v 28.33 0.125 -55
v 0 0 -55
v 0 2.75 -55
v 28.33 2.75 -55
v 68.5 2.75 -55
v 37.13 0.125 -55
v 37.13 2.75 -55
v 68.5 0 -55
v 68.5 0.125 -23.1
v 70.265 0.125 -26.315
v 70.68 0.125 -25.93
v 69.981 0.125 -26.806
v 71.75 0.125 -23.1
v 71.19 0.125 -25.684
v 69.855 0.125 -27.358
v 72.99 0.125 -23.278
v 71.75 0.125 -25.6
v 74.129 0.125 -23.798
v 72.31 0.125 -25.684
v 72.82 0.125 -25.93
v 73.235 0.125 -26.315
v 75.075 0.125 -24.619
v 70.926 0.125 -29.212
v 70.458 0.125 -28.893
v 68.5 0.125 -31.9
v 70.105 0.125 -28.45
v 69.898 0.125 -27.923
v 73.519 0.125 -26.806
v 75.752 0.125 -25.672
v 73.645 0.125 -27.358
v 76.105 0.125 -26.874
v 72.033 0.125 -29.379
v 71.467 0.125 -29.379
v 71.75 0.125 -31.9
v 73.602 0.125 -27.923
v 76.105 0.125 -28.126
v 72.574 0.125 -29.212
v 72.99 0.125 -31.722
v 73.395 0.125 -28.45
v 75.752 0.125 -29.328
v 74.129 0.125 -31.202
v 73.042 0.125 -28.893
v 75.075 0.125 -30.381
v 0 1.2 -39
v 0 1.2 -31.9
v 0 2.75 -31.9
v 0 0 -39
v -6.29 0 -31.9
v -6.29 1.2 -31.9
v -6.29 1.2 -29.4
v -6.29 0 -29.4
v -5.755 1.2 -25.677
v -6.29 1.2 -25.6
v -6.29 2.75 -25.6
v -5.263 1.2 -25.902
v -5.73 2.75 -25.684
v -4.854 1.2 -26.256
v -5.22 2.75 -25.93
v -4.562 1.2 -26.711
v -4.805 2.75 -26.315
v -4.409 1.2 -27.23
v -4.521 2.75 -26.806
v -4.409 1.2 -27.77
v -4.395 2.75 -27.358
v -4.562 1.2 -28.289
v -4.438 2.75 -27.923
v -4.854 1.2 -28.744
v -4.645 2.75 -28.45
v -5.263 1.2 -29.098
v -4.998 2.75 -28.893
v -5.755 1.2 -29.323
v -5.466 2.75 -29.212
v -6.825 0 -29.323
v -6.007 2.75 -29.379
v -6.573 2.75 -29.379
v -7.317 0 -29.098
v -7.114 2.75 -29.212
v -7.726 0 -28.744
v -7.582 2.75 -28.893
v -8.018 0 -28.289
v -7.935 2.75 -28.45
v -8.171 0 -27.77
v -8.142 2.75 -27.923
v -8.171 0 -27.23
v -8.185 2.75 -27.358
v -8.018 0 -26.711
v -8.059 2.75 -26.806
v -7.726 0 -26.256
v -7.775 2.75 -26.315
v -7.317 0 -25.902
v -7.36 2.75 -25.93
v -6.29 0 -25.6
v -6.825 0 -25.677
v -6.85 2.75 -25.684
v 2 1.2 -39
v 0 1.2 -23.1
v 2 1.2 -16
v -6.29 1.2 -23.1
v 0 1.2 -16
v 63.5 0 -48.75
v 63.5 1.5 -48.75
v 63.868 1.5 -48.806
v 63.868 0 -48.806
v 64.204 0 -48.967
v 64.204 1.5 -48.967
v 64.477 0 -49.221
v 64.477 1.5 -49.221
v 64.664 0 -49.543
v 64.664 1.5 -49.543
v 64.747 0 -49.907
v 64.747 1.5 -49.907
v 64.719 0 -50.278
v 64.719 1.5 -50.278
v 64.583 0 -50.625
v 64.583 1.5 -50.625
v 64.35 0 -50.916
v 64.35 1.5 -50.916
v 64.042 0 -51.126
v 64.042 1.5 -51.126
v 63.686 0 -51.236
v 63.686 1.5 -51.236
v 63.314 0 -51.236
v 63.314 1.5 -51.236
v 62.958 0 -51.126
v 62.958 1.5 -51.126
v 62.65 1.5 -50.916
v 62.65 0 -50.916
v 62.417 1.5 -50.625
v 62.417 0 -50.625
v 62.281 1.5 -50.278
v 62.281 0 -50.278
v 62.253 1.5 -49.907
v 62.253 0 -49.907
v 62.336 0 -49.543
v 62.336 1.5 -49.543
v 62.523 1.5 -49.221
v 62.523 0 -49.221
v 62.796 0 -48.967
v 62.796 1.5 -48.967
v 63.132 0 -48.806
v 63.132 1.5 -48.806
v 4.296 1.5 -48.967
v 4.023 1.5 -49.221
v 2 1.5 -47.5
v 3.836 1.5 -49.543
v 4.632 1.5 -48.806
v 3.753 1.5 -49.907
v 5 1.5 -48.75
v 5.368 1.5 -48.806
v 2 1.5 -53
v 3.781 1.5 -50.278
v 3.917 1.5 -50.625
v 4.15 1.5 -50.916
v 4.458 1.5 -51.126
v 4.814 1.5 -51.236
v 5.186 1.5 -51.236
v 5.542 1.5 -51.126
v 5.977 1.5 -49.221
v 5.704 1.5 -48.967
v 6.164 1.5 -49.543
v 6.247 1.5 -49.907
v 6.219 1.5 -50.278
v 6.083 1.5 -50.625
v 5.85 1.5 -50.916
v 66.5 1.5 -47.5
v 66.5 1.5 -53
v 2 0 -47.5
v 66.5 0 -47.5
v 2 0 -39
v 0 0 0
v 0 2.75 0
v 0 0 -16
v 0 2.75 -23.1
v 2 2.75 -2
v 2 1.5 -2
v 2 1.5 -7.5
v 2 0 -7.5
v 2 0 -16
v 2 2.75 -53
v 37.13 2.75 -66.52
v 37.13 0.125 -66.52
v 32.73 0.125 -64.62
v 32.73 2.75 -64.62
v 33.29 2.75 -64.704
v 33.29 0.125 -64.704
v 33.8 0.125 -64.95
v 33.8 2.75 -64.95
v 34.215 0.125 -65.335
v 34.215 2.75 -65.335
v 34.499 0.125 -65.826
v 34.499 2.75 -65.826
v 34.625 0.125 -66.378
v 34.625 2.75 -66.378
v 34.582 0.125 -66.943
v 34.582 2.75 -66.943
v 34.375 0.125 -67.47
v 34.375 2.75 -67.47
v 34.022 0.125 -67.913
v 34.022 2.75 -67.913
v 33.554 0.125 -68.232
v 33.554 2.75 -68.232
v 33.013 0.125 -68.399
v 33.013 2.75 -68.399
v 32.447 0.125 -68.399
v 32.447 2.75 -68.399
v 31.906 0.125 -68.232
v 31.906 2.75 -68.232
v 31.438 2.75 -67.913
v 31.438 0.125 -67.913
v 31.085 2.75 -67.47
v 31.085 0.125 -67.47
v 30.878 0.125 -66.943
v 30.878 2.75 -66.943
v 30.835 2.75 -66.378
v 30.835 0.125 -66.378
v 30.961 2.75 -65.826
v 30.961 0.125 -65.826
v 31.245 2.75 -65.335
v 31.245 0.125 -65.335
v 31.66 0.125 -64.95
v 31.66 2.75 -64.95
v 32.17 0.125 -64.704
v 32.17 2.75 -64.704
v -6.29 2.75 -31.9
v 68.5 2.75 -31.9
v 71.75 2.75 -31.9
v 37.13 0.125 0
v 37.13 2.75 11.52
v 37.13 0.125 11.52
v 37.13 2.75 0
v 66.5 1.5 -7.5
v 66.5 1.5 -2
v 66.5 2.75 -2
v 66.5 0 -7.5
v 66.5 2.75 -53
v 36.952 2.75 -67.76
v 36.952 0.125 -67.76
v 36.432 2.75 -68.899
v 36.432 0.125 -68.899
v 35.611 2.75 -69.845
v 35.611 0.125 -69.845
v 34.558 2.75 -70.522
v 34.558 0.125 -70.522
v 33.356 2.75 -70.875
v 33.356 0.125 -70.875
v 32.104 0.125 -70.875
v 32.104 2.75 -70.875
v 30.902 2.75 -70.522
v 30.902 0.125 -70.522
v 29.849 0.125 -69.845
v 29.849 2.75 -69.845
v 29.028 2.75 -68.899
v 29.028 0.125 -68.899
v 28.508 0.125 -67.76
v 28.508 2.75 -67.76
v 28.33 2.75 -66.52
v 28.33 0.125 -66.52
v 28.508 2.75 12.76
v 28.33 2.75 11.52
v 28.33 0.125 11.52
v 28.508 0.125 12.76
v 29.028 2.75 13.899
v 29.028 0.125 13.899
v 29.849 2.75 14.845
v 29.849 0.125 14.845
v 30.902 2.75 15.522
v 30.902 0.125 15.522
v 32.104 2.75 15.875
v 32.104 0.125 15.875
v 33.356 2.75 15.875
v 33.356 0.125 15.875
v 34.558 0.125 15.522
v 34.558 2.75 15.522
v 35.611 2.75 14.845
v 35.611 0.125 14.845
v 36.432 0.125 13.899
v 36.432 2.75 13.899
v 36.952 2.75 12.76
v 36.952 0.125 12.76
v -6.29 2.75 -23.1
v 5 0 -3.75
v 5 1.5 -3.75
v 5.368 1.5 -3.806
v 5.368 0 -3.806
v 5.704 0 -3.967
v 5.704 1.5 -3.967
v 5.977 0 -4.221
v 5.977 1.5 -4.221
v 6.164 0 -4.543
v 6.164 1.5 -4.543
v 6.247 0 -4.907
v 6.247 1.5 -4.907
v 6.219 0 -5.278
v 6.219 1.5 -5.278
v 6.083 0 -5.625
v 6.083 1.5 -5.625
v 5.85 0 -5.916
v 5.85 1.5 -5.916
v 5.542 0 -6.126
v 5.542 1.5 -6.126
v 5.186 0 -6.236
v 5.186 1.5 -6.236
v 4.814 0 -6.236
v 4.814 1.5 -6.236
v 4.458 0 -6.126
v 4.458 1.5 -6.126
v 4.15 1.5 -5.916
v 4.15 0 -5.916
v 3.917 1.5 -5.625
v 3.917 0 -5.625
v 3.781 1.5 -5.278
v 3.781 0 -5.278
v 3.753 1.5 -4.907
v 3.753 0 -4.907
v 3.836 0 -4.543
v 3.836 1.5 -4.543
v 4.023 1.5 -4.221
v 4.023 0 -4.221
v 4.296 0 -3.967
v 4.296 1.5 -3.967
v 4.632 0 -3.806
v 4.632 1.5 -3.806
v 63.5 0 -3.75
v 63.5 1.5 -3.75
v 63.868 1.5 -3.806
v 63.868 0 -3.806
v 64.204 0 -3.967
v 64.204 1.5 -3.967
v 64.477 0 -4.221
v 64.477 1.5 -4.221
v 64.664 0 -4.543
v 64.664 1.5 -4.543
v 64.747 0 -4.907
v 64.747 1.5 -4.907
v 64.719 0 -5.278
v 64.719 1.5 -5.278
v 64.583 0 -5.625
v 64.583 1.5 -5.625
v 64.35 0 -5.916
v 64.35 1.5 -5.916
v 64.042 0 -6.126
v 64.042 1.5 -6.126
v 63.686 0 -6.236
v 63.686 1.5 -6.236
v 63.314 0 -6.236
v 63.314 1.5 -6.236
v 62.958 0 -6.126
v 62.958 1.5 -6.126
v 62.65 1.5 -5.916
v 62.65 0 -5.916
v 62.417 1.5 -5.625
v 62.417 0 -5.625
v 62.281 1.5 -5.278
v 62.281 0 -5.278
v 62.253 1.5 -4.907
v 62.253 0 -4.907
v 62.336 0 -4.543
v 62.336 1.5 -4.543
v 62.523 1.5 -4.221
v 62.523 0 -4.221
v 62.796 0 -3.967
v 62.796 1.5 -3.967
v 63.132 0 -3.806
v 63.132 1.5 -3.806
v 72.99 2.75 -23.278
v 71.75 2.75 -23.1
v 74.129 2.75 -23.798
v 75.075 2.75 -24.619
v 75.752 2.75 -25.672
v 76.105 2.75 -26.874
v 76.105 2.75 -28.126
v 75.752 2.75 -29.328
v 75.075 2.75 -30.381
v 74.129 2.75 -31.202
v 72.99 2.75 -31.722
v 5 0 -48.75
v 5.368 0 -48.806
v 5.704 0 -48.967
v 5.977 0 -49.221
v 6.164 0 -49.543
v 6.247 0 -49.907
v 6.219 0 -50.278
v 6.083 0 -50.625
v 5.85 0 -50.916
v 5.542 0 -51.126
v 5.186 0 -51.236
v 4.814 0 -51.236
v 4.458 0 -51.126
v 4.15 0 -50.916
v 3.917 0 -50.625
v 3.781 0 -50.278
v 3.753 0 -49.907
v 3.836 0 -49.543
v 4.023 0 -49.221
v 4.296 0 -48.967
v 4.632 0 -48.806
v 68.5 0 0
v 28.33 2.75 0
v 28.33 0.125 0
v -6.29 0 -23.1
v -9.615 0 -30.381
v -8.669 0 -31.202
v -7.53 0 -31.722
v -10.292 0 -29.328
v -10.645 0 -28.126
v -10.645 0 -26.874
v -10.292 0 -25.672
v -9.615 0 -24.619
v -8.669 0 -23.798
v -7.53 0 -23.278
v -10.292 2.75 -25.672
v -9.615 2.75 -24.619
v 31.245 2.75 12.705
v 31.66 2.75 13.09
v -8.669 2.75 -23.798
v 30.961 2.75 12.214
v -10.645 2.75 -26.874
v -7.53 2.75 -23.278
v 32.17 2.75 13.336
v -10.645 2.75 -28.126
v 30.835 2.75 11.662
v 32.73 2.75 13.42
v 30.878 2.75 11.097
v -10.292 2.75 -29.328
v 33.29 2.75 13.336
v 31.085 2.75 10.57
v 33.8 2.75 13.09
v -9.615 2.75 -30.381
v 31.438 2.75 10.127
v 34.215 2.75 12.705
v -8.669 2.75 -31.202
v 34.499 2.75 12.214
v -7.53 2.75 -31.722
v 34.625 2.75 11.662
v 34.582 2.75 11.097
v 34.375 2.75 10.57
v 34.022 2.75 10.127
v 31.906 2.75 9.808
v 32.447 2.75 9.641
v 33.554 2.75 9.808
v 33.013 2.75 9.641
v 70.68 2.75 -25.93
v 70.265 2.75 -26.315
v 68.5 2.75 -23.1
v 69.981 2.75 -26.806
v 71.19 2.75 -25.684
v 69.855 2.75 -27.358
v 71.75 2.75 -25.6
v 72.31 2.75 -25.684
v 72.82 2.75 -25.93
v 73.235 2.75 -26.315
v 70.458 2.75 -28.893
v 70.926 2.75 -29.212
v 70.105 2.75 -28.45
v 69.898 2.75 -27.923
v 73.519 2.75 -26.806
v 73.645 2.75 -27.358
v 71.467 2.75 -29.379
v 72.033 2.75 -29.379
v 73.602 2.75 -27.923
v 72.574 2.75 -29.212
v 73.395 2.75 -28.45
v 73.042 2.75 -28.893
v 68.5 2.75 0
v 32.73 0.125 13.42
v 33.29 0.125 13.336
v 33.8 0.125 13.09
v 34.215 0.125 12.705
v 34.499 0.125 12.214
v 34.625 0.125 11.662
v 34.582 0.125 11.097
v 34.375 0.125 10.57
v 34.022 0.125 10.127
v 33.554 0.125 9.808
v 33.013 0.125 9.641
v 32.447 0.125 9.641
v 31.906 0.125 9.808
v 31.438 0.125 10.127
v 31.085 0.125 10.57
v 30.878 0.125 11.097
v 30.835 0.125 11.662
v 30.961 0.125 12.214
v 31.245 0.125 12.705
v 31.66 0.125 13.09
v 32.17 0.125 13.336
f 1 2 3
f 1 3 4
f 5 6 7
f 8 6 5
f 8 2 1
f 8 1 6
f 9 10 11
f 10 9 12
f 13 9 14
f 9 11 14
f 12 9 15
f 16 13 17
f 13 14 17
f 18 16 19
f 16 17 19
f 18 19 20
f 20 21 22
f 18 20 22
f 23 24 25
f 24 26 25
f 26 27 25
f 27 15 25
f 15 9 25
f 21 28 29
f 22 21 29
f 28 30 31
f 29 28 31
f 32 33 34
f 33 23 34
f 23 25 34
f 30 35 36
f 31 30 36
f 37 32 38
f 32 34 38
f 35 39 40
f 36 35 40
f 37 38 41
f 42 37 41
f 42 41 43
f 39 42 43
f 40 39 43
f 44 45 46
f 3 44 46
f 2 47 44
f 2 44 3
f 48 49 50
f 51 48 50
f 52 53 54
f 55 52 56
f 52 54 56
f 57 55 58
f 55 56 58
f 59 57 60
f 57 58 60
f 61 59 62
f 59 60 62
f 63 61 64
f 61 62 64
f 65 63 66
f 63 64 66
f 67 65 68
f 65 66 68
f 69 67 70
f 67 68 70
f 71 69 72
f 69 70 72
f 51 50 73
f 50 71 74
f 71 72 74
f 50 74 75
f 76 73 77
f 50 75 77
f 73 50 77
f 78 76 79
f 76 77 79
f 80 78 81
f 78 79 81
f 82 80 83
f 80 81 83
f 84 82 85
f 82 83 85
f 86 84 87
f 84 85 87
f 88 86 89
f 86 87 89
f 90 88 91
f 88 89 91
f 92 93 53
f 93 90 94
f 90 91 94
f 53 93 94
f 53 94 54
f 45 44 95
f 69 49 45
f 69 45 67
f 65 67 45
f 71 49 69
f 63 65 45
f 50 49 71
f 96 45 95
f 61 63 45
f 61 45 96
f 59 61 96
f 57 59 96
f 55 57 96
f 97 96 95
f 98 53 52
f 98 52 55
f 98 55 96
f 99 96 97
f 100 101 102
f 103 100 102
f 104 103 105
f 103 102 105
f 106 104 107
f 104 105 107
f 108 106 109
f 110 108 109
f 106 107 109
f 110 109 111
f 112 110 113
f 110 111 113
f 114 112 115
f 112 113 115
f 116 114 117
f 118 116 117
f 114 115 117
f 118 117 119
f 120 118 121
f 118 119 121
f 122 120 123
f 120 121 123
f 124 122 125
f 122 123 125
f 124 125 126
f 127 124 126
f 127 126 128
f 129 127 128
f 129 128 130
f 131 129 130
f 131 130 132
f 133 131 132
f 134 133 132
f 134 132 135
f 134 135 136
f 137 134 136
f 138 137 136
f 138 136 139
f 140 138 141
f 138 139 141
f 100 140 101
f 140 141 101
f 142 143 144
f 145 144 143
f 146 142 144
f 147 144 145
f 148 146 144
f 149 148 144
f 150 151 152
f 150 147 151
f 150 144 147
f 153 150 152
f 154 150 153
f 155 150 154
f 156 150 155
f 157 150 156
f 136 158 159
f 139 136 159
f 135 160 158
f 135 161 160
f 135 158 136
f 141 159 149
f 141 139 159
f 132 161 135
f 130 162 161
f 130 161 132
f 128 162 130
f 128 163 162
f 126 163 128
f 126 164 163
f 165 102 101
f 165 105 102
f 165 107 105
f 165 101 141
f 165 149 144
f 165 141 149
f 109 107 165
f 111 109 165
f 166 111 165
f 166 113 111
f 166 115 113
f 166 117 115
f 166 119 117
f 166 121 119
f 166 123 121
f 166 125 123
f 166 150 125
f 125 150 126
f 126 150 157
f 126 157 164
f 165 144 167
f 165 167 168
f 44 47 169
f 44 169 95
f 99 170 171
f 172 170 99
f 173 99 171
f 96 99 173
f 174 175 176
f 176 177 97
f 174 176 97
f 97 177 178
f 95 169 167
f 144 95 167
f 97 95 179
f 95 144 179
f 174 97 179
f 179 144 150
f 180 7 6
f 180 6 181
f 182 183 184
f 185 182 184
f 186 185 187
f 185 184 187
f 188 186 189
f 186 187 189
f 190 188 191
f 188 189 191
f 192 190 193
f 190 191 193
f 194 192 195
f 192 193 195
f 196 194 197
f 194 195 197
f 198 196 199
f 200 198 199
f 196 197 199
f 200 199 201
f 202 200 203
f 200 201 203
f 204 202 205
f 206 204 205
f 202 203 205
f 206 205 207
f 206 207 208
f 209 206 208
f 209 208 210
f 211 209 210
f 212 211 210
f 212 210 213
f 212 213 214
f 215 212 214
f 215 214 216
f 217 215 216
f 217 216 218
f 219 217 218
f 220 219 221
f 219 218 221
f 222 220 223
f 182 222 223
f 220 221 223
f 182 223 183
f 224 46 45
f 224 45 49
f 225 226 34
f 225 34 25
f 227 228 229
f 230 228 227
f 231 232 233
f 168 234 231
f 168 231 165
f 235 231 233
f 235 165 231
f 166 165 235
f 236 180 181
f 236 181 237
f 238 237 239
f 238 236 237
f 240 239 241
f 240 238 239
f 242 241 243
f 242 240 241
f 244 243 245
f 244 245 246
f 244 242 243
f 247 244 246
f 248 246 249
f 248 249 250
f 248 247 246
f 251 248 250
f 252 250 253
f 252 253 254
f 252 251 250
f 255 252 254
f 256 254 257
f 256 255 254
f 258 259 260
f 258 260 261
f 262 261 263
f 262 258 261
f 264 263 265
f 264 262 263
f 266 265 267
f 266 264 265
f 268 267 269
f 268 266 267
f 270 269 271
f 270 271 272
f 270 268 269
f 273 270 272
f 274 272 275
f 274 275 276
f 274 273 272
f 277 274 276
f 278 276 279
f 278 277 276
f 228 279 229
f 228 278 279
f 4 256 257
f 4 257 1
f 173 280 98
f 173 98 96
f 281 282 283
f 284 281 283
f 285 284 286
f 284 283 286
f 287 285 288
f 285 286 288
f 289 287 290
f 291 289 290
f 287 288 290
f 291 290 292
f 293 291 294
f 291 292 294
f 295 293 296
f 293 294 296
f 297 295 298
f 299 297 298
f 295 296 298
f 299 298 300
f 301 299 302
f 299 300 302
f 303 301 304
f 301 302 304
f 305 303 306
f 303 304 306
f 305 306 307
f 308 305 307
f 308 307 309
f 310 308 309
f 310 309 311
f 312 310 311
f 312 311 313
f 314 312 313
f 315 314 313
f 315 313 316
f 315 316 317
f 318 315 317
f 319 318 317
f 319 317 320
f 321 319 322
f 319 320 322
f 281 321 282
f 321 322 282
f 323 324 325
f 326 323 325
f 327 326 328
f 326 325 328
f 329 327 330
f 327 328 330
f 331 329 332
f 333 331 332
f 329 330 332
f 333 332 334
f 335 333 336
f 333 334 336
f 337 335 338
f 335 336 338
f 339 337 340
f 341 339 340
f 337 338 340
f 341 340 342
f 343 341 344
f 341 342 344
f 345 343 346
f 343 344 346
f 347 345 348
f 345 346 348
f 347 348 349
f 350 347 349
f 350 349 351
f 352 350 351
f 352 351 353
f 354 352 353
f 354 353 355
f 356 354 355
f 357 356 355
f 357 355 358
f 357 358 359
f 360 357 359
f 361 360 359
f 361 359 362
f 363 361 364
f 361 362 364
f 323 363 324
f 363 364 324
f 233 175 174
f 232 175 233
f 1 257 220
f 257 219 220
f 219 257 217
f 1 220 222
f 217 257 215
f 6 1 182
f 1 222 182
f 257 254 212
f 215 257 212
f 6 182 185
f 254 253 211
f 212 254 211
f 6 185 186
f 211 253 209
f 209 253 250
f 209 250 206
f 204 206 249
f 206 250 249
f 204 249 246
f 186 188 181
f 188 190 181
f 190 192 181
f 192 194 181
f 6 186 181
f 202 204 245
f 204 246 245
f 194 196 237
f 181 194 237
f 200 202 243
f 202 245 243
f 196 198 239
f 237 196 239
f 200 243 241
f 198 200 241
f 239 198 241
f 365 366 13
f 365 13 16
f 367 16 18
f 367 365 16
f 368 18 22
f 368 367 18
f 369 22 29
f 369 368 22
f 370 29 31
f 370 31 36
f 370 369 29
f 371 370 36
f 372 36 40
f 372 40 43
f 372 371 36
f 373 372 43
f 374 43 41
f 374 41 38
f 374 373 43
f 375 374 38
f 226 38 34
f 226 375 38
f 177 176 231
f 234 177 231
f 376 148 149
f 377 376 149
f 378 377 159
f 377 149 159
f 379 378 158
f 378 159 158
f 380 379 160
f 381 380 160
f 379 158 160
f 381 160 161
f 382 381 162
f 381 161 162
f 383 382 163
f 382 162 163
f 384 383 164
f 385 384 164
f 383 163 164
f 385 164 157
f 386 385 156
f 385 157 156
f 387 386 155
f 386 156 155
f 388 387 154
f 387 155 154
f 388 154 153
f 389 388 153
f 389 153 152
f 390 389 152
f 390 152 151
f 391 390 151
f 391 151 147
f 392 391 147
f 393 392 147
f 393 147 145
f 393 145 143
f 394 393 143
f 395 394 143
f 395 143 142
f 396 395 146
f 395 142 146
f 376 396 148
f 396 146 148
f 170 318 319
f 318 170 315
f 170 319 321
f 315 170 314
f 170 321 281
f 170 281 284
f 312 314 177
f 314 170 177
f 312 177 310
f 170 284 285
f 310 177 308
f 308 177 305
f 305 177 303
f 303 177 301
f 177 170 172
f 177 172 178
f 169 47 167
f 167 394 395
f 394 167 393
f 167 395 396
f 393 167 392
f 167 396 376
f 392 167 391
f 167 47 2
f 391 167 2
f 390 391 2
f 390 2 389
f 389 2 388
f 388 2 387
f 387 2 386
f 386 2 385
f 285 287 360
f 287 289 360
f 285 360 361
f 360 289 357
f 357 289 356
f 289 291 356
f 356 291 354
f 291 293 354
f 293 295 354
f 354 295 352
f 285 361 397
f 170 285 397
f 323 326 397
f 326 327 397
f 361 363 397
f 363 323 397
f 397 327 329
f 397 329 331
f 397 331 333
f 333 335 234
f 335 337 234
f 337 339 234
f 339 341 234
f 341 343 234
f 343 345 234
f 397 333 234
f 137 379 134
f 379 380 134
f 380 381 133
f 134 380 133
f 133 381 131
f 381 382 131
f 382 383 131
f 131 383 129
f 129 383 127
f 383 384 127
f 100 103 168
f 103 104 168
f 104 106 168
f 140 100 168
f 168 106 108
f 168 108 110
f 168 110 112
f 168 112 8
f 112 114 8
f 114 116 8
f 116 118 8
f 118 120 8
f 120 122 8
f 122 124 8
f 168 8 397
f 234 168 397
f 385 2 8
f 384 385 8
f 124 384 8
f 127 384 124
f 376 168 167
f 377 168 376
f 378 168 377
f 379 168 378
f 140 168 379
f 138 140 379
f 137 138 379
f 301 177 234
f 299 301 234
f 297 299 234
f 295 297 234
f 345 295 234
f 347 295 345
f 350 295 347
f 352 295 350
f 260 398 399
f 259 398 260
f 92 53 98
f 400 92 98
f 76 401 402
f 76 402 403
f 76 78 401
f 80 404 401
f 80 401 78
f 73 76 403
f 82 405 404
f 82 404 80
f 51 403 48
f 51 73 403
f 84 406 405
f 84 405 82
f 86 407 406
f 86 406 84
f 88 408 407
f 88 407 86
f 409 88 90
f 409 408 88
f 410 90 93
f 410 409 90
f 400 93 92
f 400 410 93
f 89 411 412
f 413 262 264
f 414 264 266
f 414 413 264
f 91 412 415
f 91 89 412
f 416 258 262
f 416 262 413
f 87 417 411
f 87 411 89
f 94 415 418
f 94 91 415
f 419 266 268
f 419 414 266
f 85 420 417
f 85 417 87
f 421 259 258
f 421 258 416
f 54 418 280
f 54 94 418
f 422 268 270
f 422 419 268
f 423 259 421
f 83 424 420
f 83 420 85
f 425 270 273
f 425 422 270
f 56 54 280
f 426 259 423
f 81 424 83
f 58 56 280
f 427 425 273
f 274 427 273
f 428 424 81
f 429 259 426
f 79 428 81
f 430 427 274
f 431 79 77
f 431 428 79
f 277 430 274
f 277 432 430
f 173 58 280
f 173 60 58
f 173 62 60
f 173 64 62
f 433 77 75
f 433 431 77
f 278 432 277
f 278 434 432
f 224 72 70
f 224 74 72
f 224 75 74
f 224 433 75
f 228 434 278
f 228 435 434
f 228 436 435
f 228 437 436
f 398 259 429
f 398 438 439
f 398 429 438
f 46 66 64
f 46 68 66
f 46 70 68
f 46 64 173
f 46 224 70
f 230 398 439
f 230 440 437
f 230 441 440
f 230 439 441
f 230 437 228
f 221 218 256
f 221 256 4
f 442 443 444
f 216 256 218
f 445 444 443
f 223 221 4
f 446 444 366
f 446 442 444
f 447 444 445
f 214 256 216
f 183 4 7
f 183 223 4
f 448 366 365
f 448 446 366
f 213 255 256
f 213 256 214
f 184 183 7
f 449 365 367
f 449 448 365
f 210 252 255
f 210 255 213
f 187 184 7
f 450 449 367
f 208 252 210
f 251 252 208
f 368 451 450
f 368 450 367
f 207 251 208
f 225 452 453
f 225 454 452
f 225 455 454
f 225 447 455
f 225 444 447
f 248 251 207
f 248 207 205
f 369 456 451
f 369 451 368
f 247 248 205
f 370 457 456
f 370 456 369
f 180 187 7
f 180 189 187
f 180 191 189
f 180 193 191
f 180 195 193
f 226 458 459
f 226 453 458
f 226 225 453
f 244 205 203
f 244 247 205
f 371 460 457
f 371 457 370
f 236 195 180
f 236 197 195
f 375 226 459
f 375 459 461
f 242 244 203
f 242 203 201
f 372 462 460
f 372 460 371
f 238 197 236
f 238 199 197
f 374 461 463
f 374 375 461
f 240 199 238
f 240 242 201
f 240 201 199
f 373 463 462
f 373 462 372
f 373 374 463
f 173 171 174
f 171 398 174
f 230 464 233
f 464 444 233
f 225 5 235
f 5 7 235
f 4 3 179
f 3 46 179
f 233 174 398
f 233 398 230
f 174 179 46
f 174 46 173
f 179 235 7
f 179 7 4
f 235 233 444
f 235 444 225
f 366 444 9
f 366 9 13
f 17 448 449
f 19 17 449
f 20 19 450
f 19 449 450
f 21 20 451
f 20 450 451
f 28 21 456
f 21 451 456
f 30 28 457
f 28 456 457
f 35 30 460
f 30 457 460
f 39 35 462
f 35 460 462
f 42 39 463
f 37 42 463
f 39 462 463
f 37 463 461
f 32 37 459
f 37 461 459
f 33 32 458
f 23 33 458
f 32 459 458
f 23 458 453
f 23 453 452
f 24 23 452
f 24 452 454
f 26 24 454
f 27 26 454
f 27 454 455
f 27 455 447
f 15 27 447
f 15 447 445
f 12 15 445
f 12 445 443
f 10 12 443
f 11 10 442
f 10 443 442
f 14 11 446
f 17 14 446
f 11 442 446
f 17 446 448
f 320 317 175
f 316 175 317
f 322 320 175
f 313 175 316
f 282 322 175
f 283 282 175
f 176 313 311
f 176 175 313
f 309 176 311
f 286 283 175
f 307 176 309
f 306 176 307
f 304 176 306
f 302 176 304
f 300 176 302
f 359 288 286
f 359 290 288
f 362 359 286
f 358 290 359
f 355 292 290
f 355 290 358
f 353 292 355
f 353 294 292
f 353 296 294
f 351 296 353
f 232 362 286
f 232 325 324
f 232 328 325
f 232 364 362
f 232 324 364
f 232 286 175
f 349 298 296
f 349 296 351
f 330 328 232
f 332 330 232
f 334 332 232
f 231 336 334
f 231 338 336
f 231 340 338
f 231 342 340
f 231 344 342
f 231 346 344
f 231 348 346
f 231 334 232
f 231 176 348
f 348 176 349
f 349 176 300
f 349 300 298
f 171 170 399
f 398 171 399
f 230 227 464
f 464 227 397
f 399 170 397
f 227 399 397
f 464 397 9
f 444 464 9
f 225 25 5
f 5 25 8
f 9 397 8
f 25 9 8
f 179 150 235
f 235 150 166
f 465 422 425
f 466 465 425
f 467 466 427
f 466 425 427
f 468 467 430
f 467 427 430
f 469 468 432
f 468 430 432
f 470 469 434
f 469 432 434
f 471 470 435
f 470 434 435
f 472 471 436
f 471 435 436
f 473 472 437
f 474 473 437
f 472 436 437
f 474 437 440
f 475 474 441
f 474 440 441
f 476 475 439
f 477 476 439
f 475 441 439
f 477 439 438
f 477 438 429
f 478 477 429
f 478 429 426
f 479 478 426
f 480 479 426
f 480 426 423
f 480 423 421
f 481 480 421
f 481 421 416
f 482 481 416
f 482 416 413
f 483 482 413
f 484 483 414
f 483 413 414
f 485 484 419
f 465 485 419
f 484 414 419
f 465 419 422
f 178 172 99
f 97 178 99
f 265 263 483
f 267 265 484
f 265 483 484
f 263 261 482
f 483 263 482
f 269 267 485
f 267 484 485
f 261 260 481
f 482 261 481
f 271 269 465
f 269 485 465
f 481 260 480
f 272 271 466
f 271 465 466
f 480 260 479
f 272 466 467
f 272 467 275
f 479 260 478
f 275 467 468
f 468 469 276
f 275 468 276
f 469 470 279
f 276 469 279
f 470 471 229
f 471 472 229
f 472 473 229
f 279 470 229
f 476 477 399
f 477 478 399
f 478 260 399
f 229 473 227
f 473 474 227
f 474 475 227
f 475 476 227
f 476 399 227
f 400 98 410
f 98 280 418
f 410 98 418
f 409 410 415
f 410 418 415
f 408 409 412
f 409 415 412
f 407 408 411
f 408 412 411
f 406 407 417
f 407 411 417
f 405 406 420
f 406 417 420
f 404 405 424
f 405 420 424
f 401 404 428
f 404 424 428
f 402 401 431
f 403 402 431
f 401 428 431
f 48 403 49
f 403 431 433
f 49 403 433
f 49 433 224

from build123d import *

# Parameters (mm, degrees)
SKETCH1_W           = 68.5
SKETCH1_H           = 55
BOSS_EXTRUDE1_DEPTH = 1.5
SKETCH2_W           = 68.5
SKETCH2_H           = 55
SKETCH2_W_2         = 64.5
SKETCH2_H_2         = 51
BOSS_EXTRUDE2_DEPTH = 1.25
SKETCH3_R           = 1.25
SKETCH3_W           = 64.5
SKETCH3_H           = 40
CUT_EXTRUDE1_DEPTH  = 1.5
SKETCH4_W           = 23
SKETCH4_H           = 1.2
CUT_EXTRUDE2_DEPTH  = 3
SKETCH5_R           = 1.9
BOSS_EXTRUDE3_DEPTH = 2.625
SKETCH5_5_R         = 1.9
BOSS_EXTRUDE4_DEPTH = 1.55
BOSS_EXTRUDE5_DEPTH = 1.2


with BuildPart() as part:
    # Sketch1 → Boss-Extrude1 (new body)
    with BuildSketch(Plane(origin=(0, 0, 0), x_dir=(1, 0, 0), z_dir=(0, 1, 0))):
        with Locations((34.25, 27.5)):
            Rectangle(SKETCH1_W, SKETCH1_H)
    extrude(amount=BOSS_EXTRUDE1_DEPTH)

    # Sketch2 → Boss-Extrude2 (add)
    with BuildSketch(Plane(origin=(0, 1.5, 0), x_dir=(1, 0, 0), z_dir=(0, 1, 0))):
        with Locations((34.25, 27.5)):
            Rectangle(SKETCH2_W, SKETCH2_H)
        with Locations((34.25, 27.5)):
            Rectangle(SKETCH2_W_2, SKETCH2_H_2, mode=Mode.SUBTRACT)
    extrude(amount=BOSS_EXTRUDE2_DEPTH)

    # Sketch3 → Cut-Extrude1 (cut)
    with BuildSketch(Plane(origin=(0, 1.5, 0), x_dir=(1, 0, 0), z_dir=(0, 1, 0))):
        with Locations((5, 50)):
            Circle(SKETCH3_R)
        with Locations((63.5, 50)):
            Circle(SKETCH3_R)
        with Locations((63.5, 5)):
            Circle(SKETCH3_R)
        with Locations((5, 5)):
            Circle(SKETCH3_R)
        with Locations((34.25, 27.5)):
            Rectangle(SKETCH3_W, SKETCH3_H)
    extrude(amount=-CUT_EXTRUDE1_DEPTH, mode=Mode.SUBTRACT)

    # Sketch4 → Cut-Extrude2 (cut)
    with BuildSketch(Plane.ZY):
        with Locations((-27.5, 0.6)):
            Rectangle(SKETCH4_W, SKETCH4_H)
    extrude(amount=-CUT_EXTRUDE2_DEPTH, mode=Mode.SUBTRACT)

    # Sketch5 → Boss-Extrude3 (add)
    # profile 1 of 3: a face of its own
    with BuildSketch(Plane(origin=(0, 2.75, 0), x_dir=(1, 0, 0), z_dir=(0, 1, 0))):
        with BuildLine():
            Line((28.33, 55), (37.13, 55))
            Line((37.13, 55), (37.13, 66.52))
            ThreePointArc((37.13, 66.52), (32.73, 70.92), (28.33, 66.52))
            Line((28.33, 66.52), (28.33, 55))
        make_face()
        with Locations((32.73, 66.52)):
            Circle(SKETCH5_R, mode=Mode.SUBTRACT)
    # profile 2 of 3: a face of its own
    with BuildSketch(Plane(origin=(0, 2.75, 0), x_dir=(1, 0, 0), z_dir=(0, 1, 0))):
        with BuildLine():
            Line((37.13, -11.52), (37.13, 0))
            Line((37.13, 0), (28.33, 0))
            Line((28.33, 0), (28.33, -11.52))
            ThreePointArc((28.33, -11.52), (32.73, -15.92), (37.13, -11.52))
        make_face()
        with Locations((32.73, -11.52)):
            Circle(SKETCH5_R, mode=Mode.SUBTRACT)
    # profile 3 of 3: a face of its own
    with BuildSketch(Plane(origin=(0, 2.75, 0), x_dir=(1, 0, 0), z_dir=(0, 1, 0))):
        with BuildLine():
            Line((71.75, 31.9), (68.5, 31.9))
            Line((68.5, 31.9), (68.5, 23.1))
            Line((68.5, 23.1), (71.75, 23.1))
            ThreePointArc((71.75, 23.1), (76.15, 27.5), (71.75, 31.9))
        make_face()
        with Locations((71.75, 27.5)):
            Circle(SKETCH5_R, mode=Mode.SUBTRACT)
    extrude(amount=-BOSS_EXTRUDE3_DEPTH)

    # Sketch5<5> → Boss-Extrude4 (add)
    with BuildSketch(Plane(origin=(0, 2.75, 0), x_dir=(1, 0, 0), z_dir=(0, 1, 0))):
        with BuildLine():
            Line((0, 23.1), (0, 31.9))
            Line((0, 31.9), (-6.29, 31.9))
            ThreePointArc((-6.29, 31.9), (-10.69, 27.5), (-6.29, 23.1))
            Line((-6.29, 23.1), (0, 23.1))
        make_face()
        with Locations((-6.29, 27.5)):
            Circle(SKETCH5_5_R, mode=Mode.SUBTRACT)
    extrude(amount=-BOSS_EXTRUDE4_DEPTH)

    # Sketch6 → Boss-Extrude5 (add)
    with BuildSketch(Plane.XZ.offset(-1.2)):
        with BuildLine():
            Line((-6.29, -25.6), (-6.29, -23.1))
            ThreePointArc((-6.29, -23.1), (-10.69, -27.5), (-6.29, -31.9))
            Line((-6.29, -31.9), (-6.29, -29.4))
            ThreePointArc((-6.29, -29.4), (-8.19, -27.5), (-6.29, -25.6))
        make_face()
    extrude(amount=BOSS_EXTRUDE5_DEPTH)


solid = part.part
